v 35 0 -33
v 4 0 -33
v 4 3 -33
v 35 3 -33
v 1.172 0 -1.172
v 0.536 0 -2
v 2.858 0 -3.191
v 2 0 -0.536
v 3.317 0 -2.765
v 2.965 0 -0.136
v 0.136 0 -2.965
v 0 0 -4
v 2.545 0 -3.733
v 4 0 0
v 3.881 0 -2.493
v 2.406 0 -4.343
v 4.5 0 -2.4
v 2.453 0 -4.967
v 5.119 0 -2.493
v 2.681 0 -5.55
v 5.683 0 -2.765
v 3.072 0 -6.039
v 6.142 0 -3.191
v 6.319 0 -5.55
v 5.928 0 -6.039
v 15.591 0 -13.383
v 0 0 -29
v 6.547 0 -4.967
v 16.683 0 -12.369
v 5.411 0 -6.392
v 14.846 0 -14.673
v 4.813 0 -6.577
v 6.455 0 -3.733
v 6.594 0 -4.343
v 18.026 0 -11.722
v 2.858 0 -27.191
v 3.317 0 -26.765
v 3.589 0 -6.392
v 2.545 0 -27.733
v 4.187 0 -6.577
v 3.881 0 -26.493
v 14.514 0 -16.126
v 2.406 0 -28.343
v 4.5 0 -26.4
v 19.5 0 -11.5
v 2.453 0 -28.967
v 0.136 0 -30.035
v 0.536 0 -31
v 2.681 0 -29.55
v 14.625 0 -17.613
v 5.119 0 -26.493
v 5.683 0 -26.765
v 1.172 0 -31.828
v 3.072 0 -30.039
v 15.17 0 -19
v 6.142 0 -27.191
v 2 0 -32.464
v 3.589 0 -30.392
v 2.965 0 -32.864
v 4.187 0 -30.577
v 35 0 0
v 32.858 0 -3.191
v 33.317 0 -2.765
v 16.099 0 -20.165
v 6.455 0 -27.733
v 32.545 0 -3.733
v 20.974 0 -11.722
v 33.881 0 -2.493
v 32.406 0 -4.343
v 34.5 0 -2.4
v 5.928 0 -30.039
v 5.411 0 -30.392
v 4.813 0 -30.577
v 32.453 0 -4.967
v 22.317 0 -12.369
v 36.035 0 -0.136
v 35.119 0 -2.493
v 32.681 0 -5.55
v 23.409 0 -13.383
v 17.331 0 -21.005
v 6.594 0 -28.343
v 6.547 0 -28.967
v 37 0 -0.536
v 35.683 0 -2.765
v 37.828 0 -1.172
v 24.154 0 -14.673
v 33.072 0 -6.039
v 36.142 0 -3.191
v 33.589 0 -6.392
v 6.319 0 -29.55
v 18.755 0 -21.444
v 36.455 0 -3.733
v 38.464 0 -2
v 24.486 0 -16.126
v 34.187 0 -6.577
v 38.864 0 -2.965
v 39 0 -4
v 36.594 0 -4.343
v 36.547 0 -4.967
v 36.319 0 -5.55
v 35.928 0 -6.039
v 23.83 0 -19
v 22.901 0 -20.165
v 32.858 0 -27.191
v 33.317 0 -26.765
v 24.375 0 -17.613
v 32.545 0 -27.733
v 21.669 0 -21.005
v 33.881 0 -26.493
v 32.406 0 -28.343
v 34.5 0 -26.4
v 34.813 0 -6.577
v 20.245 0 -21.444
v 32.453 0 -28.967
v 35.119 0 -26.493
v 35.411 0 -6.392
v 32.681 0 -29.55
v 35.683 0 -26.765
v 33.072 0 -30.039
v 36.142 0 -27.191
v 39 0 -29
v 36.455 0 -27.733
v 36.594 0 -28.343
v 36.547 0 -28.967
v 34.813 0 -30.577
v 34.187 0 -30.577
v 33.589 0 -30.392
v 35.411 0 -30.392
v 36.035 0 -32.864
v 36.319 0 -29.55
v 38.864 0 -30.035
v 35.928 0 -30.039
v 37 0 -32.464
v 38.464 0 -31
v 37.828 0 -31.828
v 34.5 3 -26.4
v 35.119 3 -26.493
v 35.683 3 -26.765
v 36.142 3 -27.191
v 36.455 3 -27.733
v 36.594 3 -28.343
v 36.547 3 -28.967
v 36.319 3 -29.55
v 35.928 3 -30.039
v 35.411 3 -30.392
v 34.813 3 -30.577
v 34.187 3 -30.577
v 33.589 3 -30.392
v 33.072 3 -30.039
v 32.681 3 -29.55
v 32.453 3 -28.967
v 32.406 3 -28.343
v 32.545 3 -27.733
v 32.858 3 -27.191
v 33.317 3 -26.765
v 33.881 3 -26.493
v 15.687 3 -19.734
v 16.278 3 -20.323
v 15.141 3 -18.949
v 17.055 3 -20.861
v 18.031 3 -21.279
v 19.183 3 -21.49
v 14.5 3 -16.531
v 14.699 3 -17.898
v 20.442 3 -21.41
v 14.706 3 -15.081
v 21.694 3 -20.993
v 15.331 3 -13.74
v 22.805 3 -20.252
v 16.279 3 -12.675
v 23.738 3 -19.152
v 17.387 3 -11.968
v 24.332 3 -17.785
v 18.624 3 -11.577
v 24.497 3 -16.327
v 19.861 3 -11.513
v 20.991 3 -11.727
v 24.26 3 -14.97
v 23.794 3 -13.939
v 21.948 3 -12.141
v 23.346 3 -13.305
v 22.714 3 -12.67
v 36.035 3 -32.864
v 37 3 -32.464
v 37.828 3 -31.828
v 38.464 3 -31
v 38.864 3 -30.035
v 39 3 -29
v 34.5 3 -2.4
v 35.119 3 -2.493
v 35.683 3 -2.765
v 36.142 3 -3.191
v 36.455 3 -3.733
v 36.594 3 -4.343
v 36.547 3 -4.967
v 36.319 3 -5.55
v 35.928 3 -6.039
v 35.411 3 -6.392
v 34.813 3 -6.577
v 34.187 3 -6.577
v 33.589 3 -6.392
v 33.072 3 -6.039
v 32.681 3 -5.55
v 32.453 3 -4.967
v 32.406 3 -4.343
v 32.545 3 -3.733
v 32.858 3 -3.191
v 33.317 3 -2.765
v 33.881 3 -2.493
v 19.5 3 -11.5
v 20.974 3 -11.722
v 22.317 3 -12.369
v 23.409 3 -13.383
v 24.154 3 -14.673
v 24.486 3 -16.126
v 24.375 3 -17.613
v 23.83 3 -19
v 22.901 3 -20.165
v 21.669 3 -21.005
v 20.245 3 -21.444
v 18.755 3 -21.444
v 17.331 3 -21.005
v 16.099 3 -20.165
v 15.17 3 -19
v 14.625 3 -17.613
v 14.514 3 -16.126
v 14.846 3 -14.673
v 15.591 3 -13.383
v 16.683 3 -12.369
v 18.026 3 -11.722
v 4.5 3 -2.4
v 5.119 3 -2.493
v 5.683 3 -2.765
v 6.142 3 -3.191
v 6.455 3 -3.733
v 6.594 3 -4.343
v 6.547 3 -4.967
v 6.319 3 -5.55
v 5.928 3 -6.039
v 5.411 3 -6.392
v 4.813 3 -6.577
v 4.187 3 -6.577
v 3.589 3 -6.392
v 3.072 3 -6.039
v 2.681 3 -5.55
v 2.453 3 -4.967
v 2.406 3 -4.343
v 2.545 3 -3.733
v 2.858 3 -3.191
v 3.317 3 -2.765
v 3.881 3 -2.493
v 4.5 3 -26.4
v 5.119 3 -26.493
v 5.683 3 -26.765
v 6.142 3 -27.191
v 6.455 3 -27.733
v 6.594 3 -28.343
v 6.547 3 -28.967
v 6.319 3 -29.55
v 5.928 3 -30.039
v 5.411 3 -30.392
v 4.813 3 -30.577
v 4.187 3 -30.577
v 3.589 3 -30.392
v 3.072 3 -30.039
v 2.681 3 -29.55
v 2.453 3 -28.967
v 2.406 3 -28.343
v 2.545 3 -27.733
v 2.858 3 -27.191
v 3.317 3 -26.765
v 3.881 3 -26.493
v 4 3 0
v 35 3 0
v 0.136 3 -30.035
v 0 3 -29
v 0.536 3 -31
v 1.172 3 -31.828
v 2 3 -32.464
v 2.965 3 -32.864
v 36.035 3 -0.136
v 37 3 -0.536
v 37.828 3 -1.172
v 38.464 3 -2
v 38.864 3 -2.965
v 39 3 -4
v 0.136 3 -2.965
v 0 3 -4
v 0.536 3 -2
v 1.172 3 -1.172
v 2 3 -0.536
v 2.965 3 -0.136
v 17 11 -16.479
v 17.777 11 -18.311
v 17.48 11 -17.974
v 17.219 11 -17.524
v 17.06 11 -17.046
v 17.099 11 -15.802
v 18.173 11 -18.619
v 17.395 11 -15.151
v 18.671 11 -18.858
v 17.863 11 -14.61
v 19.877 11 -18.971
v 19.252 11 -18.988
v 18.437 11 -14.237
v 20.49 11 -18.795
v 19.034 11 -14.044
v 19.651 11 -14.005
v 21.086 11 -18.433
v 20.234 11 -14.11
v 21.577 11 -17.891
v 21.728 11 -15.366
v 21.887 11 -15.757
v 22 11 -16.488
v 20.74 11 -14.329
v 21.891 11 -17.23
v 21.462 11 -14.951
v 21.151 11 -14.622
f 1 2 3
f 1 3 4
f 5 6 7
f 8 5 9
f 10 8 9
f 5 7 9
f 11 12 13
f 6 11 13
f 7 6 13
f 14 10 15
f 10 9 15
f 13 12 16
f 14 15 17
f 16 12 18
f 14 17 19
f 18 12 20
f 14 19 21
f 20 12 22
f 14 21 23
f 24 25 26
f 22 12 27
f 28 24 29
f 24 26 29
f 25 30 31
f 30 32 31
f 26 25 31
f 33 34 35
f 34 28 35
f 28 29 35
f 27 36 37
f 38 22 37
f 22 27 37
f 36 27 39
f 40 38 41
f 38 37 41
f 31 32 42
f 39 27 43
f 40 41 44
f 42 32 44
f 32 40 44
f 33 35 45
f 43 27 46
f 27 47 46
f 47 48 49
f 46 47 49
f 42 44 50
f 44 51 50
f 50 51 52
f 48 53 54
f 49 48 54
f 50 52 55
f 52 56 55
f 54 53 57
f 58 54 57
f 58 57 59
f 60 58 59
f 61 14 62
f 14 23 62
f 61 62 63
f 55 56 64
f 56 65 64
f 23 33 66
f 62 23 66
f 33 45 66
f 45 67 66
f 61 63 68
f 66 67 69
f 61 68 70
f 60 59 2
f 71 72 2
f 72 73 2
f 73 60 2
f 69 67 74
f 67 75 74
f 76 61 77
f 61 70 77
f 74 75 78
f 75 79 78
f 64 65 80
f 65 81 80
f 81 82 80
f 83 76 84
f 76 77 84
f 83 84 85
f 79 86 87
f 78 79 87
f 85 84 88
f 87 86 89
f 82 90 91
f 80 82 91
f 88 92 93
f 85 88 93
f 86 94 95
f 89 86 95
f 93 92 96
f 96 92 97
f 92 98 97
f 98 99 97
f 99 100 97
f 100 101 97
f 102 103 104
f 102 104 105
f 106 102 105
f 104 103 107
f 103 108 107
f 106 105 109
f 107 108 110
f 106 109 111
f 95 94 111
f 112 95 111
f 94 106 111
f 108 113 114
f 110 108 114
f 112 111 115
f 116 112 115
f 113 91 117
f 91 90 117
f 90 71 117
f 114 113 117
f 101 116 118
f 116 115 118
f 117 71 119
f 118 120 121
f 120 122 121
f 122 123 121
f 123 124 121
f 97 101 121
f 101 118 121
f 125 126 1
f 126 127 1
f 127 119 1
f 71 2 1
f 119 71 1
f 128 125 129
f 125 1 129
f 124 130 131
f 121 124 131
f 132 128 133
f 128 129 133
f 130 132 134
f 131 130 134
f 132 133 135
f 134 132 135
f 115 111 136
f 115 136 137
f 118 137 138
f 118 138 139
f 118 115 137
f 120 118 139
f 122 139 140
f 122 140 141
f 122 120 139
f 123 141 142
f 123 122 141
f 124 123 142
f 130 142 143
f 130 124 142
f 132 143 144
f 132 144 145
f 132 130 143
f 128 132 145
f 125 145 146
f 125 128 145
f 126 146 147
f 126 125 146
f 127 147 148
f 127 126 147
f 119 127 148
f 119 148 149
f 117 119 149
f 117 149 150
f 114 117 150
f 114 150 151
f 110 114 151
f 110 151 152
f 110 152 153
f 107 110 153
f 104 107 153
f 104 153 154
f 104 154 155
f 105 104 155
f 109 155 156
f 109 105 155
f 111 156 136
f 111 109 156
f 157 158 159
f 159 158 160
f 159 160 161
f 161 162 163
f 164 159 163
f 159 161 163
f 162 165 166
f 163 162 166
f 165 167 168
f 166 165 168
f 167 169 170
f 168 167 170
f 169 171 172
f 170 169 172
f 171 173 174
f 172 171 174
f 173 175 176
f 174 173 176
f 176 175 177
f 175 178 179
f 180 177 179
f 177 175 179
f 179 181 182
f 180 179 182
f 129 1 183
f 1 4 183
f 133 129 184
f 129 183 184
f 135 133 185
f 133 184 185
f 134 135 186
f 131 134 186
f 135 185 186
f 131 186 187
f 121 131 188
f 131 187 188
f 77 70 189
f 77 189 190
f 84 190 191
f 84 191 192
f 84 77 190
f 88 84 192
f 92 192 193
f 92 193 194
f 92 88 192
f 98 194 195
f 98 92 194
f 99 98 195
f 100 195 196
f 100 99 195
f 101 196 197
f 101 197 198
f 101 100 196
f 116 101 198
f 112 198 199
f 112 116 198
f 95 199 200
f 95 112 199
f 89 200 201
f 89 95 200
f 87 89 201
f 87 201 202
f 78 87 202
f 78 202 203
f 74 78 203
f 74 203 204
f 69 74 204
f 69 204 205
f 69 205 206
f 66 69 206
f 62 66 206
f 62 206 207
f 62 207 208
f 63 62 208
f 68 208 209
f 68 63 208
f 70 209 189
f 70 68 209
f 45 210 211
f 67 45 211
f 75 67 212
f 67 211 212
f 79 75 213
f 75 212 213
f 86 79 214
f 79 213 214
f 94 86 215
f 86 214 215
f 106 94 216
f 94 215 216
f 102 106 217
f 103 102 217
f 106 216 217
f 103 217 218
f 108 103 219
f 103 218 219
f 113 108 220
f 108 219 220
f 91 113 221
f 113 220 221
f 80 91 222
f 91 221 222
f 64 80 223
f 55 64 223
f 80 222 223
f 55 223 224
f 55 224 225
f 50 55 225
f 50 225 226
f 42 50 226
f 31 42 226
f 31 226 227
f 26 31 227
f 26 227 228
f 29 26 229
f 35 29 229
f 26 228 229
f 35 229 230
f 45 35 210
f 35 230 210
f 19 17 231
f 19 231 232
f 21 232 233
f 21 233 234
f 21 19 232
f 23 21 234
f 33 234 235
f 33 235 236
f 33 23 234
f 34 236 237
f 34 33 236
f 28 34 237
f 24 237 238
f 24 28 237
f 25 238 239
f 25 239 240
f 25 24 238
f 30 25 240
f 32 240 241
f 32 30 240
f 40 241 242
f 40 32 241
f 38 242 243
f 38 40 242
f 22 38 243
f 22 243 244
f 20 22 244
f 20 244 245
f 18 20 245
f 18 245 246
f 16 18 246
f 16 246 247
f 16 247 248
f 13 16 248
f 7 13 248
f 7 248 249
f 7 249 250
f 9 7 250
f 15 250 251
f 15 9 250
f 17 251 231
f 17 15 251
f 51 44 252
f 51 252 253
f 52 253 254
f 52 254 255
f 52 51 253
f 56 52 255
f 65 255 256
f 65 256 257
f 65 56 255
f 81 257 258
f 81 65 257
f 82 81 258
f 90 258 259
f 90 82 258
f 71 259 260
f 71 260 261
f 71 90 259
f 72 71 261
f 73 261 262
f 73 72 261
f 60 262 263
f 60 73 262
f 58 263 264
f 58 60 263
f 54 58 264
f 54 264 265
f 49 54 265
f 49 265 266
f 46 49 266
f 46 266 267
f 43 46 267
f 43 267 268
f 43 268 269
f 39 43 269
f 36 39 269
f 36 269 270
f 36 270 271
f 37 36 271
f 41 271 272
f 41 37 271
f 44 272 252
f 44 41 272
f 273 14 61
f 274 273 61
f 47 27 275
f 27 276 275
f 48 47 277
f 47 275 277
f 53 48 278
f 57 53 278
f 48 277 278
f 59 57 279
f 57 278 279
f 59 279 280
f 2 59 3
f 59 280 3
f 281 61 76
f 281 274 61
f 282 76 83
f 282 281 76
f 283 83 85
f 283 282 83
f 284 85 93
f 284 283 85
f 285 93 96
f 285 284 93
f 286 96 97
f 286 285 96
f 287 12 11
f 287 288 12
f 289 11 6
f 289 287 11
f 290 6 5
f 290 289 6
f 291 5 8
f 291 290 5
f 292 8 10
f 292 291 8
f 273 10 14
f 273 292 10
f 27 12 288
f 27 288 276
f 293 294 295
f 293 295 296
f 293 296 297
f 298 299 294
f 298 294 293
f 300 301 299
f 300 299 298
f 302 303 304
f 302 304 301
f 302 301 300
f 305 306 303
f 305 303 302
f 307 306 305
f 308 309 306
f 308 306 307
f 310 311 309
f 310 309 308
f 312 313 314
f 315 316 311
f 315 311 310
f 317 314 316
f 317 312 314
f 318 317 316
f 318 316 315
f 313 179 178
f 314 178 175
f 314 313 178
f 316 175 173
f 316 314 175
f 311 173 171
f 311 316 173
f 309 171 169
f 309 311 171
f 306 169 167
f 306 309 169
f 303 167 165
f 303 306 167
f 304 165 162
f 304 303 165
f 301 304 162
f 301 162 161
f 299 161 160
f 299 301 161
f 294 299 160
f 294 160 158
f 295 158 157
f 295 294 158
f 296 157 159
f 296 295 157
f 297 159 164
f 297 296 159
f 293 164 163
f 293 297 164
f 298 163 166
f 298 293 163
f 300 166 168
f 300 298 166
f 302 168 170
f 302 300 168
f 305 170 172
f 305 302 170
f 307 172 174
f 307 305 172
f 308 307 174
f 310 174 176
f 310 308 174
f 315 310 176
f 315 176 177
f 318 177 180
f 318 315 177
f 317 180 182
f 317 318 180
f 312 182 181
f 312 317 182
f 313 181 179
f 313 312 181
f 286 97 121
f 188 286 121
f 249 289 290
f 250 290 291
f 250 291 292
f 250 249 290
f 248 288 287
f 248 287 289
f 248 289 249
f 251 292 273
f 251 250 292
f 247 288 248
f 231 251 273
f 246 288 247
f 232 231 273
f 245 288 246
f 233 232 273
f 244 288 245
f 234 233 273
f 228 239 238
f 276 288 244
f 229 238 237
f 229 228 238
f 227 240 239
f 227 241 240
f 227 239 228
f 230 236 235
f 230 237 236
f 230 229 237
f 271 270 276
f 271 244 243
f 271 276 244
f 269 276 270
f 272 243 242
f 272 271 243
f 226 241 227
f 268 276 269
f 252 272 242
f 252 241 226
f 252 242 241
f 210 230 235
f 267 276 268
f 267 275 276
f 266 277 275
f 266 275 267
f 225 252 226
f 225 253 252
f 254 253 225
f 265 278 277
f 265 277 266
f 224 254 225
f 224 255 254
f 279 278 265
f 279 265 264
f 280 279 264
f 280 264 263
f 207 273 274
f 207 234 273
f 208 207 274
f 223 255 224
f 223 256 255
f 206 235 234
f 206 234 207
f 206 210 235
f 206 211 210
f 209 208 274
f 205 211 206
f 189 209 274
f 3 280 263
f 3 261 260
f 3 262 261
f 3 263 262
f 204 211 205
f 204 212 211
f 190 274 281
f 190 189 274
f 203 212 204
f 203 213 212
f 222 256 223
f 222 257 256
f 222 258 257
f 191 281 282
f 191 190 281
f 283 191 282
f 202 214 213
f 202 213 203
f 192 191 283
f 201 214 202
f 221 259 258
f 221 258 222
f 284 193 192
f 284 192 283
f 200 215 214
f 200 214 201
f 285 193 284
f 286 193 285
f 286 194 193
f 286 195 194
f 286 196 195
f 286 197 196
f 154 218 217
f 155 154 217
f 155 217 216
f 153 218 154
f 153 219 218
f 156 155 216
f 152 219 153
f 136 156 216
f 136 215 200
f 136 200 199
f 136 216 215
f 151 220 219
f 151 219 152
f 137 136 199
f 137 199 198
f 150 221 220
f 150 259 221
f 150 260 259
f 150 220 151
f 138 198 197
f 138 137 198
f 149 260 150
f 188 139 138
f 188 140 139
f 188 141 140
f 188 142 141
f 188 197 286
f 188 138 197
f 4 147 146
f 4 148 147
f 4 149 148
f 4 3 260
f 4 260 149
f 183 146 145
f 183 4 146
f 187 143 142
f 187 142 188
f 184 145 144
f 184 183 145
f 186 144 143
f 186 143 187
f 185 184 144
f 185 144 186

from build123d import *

# Parameters (mm, degrees)
SKETCH_1_W          = 39
SKETCH_1_H          = 33
SKETCH_1_R          = 2.1
EXTRUDE_1_DEPTH     = 3
FILLET_1_R          = 4
SKETCH_2_R          = 5
CUT_EXTRUDE_1_DEPTH = 3


with BuildPart() as part:
    # 草图1 → 凸台-拉伸1 (new body)
    with BuildSketch(Plane(origin=(0, 0, 0), x_dir=(1, 0, 0), z_dir=(0, 1, 0))):
        with Locations((19.5, 16.5)):
            Rectangle(SKETCH_1_W, SKETCH_1_H)
        with Locations(Location((4.5, 28.5, 0), (0, 0, 270))):
            Circle(SKETCH_1_R, mode=Mode.SUBTRACT)
        with Locations(Location((34.5, 28.5, 0), (0, 0, 270))):
            Circle(SKETCH_1_R, mode=Mode.SUBTRACT)
        with Locations(Location((34.5, 4.5, 0), (0, 0, 270))):
            Circle(SKETCH_1_R, mode=Mode.SUBTRACT)
        with Locations(Location((4.5, 4.5, 0), (0, 0, 270))):
            Circle(SKETCH_1_R, mode=Mode.SUBTRACT)
    extrude(amount=EXTRUDE_1_DEPTH)

    # 圆角1
    fillet_1_edges = [part.edges().sort_by_distance(p)[0] for p in [
        (0, 1.5, -33),
        (39, 1.5, -33),
        (39, 1.5, 0),
        (0, 1.5, 0),
    ]]
    fillet(fillet_1_edges, radius=FILLET_1_R)

    # 草图2 → 切除-拉伸1 (cut)
    with BuildSketch(Plane(origin=(0, 3, 0), x_dir=(1, 0, 0), z_dir=(0, 1, 0))):
        with Locations(Location((19.5, 16.5, 0), (0, 0, 270))):
            Circle(SKETCH_2_R)
    extrude(amount=-CUT_EXTRUDE_1_DEPTH, mode=Mode.SUBTRACT)


with BuildPart() as body_2:
    # 放样1: read off the stored shape, not the designer's step
    # 放样1: loft between two sections, ruled curve by curve
    loft_1_from = [
        Edge.make_bspline([(23.79408437, 3, -13.938586441), (28.916911488, 3, -22.526755182), (20.328742747, 3, -27.6495823), (15.20591563, 3, -19.061413559), (10.083088512, 3, -10.473244818), (18.671257253, 3, -5.3504177), (23.79408437, 3, -13.938586441)], [0, 0, 0, 0, 0.5, 0.5, 0.5, 1, 1, 1, 1], 3, [1, 0.333333333, 0.333333333, 1, 0.333333333, 0.333333333, 1]),
    ]
    loft_1_to = [
        Edge.make_bspline([(21.887161362, 11, -15.757396046), (23.37236927, 11, -20.53171877), (18.598046546, 11, -22.016926678), (17.112838638, 11, -17.242603954), (15.62763073, 11, -12.46828123), (20.401953454, 11, -10.983073322), (21.887161362, 11, -15.757396046)], [0, 0, 0, 0, 0.5, 0.5, 0.5, 1, 1, 1, 1], 3, [1, 0.333333333, 0.333333333, 1, 0.333333333, 0.333333333, 1]),
    ]
    loft_1 = Solid(Shell([*[Face.make_surface_from_curves(loft_1_from[k], loft_1_to[k]) for k in range(1)], Face(Wire(loft_1_from)), Face(Wire(loft_1_to))]))
    add(loft_1)


solid = Compound([part.part, body_2.part])
